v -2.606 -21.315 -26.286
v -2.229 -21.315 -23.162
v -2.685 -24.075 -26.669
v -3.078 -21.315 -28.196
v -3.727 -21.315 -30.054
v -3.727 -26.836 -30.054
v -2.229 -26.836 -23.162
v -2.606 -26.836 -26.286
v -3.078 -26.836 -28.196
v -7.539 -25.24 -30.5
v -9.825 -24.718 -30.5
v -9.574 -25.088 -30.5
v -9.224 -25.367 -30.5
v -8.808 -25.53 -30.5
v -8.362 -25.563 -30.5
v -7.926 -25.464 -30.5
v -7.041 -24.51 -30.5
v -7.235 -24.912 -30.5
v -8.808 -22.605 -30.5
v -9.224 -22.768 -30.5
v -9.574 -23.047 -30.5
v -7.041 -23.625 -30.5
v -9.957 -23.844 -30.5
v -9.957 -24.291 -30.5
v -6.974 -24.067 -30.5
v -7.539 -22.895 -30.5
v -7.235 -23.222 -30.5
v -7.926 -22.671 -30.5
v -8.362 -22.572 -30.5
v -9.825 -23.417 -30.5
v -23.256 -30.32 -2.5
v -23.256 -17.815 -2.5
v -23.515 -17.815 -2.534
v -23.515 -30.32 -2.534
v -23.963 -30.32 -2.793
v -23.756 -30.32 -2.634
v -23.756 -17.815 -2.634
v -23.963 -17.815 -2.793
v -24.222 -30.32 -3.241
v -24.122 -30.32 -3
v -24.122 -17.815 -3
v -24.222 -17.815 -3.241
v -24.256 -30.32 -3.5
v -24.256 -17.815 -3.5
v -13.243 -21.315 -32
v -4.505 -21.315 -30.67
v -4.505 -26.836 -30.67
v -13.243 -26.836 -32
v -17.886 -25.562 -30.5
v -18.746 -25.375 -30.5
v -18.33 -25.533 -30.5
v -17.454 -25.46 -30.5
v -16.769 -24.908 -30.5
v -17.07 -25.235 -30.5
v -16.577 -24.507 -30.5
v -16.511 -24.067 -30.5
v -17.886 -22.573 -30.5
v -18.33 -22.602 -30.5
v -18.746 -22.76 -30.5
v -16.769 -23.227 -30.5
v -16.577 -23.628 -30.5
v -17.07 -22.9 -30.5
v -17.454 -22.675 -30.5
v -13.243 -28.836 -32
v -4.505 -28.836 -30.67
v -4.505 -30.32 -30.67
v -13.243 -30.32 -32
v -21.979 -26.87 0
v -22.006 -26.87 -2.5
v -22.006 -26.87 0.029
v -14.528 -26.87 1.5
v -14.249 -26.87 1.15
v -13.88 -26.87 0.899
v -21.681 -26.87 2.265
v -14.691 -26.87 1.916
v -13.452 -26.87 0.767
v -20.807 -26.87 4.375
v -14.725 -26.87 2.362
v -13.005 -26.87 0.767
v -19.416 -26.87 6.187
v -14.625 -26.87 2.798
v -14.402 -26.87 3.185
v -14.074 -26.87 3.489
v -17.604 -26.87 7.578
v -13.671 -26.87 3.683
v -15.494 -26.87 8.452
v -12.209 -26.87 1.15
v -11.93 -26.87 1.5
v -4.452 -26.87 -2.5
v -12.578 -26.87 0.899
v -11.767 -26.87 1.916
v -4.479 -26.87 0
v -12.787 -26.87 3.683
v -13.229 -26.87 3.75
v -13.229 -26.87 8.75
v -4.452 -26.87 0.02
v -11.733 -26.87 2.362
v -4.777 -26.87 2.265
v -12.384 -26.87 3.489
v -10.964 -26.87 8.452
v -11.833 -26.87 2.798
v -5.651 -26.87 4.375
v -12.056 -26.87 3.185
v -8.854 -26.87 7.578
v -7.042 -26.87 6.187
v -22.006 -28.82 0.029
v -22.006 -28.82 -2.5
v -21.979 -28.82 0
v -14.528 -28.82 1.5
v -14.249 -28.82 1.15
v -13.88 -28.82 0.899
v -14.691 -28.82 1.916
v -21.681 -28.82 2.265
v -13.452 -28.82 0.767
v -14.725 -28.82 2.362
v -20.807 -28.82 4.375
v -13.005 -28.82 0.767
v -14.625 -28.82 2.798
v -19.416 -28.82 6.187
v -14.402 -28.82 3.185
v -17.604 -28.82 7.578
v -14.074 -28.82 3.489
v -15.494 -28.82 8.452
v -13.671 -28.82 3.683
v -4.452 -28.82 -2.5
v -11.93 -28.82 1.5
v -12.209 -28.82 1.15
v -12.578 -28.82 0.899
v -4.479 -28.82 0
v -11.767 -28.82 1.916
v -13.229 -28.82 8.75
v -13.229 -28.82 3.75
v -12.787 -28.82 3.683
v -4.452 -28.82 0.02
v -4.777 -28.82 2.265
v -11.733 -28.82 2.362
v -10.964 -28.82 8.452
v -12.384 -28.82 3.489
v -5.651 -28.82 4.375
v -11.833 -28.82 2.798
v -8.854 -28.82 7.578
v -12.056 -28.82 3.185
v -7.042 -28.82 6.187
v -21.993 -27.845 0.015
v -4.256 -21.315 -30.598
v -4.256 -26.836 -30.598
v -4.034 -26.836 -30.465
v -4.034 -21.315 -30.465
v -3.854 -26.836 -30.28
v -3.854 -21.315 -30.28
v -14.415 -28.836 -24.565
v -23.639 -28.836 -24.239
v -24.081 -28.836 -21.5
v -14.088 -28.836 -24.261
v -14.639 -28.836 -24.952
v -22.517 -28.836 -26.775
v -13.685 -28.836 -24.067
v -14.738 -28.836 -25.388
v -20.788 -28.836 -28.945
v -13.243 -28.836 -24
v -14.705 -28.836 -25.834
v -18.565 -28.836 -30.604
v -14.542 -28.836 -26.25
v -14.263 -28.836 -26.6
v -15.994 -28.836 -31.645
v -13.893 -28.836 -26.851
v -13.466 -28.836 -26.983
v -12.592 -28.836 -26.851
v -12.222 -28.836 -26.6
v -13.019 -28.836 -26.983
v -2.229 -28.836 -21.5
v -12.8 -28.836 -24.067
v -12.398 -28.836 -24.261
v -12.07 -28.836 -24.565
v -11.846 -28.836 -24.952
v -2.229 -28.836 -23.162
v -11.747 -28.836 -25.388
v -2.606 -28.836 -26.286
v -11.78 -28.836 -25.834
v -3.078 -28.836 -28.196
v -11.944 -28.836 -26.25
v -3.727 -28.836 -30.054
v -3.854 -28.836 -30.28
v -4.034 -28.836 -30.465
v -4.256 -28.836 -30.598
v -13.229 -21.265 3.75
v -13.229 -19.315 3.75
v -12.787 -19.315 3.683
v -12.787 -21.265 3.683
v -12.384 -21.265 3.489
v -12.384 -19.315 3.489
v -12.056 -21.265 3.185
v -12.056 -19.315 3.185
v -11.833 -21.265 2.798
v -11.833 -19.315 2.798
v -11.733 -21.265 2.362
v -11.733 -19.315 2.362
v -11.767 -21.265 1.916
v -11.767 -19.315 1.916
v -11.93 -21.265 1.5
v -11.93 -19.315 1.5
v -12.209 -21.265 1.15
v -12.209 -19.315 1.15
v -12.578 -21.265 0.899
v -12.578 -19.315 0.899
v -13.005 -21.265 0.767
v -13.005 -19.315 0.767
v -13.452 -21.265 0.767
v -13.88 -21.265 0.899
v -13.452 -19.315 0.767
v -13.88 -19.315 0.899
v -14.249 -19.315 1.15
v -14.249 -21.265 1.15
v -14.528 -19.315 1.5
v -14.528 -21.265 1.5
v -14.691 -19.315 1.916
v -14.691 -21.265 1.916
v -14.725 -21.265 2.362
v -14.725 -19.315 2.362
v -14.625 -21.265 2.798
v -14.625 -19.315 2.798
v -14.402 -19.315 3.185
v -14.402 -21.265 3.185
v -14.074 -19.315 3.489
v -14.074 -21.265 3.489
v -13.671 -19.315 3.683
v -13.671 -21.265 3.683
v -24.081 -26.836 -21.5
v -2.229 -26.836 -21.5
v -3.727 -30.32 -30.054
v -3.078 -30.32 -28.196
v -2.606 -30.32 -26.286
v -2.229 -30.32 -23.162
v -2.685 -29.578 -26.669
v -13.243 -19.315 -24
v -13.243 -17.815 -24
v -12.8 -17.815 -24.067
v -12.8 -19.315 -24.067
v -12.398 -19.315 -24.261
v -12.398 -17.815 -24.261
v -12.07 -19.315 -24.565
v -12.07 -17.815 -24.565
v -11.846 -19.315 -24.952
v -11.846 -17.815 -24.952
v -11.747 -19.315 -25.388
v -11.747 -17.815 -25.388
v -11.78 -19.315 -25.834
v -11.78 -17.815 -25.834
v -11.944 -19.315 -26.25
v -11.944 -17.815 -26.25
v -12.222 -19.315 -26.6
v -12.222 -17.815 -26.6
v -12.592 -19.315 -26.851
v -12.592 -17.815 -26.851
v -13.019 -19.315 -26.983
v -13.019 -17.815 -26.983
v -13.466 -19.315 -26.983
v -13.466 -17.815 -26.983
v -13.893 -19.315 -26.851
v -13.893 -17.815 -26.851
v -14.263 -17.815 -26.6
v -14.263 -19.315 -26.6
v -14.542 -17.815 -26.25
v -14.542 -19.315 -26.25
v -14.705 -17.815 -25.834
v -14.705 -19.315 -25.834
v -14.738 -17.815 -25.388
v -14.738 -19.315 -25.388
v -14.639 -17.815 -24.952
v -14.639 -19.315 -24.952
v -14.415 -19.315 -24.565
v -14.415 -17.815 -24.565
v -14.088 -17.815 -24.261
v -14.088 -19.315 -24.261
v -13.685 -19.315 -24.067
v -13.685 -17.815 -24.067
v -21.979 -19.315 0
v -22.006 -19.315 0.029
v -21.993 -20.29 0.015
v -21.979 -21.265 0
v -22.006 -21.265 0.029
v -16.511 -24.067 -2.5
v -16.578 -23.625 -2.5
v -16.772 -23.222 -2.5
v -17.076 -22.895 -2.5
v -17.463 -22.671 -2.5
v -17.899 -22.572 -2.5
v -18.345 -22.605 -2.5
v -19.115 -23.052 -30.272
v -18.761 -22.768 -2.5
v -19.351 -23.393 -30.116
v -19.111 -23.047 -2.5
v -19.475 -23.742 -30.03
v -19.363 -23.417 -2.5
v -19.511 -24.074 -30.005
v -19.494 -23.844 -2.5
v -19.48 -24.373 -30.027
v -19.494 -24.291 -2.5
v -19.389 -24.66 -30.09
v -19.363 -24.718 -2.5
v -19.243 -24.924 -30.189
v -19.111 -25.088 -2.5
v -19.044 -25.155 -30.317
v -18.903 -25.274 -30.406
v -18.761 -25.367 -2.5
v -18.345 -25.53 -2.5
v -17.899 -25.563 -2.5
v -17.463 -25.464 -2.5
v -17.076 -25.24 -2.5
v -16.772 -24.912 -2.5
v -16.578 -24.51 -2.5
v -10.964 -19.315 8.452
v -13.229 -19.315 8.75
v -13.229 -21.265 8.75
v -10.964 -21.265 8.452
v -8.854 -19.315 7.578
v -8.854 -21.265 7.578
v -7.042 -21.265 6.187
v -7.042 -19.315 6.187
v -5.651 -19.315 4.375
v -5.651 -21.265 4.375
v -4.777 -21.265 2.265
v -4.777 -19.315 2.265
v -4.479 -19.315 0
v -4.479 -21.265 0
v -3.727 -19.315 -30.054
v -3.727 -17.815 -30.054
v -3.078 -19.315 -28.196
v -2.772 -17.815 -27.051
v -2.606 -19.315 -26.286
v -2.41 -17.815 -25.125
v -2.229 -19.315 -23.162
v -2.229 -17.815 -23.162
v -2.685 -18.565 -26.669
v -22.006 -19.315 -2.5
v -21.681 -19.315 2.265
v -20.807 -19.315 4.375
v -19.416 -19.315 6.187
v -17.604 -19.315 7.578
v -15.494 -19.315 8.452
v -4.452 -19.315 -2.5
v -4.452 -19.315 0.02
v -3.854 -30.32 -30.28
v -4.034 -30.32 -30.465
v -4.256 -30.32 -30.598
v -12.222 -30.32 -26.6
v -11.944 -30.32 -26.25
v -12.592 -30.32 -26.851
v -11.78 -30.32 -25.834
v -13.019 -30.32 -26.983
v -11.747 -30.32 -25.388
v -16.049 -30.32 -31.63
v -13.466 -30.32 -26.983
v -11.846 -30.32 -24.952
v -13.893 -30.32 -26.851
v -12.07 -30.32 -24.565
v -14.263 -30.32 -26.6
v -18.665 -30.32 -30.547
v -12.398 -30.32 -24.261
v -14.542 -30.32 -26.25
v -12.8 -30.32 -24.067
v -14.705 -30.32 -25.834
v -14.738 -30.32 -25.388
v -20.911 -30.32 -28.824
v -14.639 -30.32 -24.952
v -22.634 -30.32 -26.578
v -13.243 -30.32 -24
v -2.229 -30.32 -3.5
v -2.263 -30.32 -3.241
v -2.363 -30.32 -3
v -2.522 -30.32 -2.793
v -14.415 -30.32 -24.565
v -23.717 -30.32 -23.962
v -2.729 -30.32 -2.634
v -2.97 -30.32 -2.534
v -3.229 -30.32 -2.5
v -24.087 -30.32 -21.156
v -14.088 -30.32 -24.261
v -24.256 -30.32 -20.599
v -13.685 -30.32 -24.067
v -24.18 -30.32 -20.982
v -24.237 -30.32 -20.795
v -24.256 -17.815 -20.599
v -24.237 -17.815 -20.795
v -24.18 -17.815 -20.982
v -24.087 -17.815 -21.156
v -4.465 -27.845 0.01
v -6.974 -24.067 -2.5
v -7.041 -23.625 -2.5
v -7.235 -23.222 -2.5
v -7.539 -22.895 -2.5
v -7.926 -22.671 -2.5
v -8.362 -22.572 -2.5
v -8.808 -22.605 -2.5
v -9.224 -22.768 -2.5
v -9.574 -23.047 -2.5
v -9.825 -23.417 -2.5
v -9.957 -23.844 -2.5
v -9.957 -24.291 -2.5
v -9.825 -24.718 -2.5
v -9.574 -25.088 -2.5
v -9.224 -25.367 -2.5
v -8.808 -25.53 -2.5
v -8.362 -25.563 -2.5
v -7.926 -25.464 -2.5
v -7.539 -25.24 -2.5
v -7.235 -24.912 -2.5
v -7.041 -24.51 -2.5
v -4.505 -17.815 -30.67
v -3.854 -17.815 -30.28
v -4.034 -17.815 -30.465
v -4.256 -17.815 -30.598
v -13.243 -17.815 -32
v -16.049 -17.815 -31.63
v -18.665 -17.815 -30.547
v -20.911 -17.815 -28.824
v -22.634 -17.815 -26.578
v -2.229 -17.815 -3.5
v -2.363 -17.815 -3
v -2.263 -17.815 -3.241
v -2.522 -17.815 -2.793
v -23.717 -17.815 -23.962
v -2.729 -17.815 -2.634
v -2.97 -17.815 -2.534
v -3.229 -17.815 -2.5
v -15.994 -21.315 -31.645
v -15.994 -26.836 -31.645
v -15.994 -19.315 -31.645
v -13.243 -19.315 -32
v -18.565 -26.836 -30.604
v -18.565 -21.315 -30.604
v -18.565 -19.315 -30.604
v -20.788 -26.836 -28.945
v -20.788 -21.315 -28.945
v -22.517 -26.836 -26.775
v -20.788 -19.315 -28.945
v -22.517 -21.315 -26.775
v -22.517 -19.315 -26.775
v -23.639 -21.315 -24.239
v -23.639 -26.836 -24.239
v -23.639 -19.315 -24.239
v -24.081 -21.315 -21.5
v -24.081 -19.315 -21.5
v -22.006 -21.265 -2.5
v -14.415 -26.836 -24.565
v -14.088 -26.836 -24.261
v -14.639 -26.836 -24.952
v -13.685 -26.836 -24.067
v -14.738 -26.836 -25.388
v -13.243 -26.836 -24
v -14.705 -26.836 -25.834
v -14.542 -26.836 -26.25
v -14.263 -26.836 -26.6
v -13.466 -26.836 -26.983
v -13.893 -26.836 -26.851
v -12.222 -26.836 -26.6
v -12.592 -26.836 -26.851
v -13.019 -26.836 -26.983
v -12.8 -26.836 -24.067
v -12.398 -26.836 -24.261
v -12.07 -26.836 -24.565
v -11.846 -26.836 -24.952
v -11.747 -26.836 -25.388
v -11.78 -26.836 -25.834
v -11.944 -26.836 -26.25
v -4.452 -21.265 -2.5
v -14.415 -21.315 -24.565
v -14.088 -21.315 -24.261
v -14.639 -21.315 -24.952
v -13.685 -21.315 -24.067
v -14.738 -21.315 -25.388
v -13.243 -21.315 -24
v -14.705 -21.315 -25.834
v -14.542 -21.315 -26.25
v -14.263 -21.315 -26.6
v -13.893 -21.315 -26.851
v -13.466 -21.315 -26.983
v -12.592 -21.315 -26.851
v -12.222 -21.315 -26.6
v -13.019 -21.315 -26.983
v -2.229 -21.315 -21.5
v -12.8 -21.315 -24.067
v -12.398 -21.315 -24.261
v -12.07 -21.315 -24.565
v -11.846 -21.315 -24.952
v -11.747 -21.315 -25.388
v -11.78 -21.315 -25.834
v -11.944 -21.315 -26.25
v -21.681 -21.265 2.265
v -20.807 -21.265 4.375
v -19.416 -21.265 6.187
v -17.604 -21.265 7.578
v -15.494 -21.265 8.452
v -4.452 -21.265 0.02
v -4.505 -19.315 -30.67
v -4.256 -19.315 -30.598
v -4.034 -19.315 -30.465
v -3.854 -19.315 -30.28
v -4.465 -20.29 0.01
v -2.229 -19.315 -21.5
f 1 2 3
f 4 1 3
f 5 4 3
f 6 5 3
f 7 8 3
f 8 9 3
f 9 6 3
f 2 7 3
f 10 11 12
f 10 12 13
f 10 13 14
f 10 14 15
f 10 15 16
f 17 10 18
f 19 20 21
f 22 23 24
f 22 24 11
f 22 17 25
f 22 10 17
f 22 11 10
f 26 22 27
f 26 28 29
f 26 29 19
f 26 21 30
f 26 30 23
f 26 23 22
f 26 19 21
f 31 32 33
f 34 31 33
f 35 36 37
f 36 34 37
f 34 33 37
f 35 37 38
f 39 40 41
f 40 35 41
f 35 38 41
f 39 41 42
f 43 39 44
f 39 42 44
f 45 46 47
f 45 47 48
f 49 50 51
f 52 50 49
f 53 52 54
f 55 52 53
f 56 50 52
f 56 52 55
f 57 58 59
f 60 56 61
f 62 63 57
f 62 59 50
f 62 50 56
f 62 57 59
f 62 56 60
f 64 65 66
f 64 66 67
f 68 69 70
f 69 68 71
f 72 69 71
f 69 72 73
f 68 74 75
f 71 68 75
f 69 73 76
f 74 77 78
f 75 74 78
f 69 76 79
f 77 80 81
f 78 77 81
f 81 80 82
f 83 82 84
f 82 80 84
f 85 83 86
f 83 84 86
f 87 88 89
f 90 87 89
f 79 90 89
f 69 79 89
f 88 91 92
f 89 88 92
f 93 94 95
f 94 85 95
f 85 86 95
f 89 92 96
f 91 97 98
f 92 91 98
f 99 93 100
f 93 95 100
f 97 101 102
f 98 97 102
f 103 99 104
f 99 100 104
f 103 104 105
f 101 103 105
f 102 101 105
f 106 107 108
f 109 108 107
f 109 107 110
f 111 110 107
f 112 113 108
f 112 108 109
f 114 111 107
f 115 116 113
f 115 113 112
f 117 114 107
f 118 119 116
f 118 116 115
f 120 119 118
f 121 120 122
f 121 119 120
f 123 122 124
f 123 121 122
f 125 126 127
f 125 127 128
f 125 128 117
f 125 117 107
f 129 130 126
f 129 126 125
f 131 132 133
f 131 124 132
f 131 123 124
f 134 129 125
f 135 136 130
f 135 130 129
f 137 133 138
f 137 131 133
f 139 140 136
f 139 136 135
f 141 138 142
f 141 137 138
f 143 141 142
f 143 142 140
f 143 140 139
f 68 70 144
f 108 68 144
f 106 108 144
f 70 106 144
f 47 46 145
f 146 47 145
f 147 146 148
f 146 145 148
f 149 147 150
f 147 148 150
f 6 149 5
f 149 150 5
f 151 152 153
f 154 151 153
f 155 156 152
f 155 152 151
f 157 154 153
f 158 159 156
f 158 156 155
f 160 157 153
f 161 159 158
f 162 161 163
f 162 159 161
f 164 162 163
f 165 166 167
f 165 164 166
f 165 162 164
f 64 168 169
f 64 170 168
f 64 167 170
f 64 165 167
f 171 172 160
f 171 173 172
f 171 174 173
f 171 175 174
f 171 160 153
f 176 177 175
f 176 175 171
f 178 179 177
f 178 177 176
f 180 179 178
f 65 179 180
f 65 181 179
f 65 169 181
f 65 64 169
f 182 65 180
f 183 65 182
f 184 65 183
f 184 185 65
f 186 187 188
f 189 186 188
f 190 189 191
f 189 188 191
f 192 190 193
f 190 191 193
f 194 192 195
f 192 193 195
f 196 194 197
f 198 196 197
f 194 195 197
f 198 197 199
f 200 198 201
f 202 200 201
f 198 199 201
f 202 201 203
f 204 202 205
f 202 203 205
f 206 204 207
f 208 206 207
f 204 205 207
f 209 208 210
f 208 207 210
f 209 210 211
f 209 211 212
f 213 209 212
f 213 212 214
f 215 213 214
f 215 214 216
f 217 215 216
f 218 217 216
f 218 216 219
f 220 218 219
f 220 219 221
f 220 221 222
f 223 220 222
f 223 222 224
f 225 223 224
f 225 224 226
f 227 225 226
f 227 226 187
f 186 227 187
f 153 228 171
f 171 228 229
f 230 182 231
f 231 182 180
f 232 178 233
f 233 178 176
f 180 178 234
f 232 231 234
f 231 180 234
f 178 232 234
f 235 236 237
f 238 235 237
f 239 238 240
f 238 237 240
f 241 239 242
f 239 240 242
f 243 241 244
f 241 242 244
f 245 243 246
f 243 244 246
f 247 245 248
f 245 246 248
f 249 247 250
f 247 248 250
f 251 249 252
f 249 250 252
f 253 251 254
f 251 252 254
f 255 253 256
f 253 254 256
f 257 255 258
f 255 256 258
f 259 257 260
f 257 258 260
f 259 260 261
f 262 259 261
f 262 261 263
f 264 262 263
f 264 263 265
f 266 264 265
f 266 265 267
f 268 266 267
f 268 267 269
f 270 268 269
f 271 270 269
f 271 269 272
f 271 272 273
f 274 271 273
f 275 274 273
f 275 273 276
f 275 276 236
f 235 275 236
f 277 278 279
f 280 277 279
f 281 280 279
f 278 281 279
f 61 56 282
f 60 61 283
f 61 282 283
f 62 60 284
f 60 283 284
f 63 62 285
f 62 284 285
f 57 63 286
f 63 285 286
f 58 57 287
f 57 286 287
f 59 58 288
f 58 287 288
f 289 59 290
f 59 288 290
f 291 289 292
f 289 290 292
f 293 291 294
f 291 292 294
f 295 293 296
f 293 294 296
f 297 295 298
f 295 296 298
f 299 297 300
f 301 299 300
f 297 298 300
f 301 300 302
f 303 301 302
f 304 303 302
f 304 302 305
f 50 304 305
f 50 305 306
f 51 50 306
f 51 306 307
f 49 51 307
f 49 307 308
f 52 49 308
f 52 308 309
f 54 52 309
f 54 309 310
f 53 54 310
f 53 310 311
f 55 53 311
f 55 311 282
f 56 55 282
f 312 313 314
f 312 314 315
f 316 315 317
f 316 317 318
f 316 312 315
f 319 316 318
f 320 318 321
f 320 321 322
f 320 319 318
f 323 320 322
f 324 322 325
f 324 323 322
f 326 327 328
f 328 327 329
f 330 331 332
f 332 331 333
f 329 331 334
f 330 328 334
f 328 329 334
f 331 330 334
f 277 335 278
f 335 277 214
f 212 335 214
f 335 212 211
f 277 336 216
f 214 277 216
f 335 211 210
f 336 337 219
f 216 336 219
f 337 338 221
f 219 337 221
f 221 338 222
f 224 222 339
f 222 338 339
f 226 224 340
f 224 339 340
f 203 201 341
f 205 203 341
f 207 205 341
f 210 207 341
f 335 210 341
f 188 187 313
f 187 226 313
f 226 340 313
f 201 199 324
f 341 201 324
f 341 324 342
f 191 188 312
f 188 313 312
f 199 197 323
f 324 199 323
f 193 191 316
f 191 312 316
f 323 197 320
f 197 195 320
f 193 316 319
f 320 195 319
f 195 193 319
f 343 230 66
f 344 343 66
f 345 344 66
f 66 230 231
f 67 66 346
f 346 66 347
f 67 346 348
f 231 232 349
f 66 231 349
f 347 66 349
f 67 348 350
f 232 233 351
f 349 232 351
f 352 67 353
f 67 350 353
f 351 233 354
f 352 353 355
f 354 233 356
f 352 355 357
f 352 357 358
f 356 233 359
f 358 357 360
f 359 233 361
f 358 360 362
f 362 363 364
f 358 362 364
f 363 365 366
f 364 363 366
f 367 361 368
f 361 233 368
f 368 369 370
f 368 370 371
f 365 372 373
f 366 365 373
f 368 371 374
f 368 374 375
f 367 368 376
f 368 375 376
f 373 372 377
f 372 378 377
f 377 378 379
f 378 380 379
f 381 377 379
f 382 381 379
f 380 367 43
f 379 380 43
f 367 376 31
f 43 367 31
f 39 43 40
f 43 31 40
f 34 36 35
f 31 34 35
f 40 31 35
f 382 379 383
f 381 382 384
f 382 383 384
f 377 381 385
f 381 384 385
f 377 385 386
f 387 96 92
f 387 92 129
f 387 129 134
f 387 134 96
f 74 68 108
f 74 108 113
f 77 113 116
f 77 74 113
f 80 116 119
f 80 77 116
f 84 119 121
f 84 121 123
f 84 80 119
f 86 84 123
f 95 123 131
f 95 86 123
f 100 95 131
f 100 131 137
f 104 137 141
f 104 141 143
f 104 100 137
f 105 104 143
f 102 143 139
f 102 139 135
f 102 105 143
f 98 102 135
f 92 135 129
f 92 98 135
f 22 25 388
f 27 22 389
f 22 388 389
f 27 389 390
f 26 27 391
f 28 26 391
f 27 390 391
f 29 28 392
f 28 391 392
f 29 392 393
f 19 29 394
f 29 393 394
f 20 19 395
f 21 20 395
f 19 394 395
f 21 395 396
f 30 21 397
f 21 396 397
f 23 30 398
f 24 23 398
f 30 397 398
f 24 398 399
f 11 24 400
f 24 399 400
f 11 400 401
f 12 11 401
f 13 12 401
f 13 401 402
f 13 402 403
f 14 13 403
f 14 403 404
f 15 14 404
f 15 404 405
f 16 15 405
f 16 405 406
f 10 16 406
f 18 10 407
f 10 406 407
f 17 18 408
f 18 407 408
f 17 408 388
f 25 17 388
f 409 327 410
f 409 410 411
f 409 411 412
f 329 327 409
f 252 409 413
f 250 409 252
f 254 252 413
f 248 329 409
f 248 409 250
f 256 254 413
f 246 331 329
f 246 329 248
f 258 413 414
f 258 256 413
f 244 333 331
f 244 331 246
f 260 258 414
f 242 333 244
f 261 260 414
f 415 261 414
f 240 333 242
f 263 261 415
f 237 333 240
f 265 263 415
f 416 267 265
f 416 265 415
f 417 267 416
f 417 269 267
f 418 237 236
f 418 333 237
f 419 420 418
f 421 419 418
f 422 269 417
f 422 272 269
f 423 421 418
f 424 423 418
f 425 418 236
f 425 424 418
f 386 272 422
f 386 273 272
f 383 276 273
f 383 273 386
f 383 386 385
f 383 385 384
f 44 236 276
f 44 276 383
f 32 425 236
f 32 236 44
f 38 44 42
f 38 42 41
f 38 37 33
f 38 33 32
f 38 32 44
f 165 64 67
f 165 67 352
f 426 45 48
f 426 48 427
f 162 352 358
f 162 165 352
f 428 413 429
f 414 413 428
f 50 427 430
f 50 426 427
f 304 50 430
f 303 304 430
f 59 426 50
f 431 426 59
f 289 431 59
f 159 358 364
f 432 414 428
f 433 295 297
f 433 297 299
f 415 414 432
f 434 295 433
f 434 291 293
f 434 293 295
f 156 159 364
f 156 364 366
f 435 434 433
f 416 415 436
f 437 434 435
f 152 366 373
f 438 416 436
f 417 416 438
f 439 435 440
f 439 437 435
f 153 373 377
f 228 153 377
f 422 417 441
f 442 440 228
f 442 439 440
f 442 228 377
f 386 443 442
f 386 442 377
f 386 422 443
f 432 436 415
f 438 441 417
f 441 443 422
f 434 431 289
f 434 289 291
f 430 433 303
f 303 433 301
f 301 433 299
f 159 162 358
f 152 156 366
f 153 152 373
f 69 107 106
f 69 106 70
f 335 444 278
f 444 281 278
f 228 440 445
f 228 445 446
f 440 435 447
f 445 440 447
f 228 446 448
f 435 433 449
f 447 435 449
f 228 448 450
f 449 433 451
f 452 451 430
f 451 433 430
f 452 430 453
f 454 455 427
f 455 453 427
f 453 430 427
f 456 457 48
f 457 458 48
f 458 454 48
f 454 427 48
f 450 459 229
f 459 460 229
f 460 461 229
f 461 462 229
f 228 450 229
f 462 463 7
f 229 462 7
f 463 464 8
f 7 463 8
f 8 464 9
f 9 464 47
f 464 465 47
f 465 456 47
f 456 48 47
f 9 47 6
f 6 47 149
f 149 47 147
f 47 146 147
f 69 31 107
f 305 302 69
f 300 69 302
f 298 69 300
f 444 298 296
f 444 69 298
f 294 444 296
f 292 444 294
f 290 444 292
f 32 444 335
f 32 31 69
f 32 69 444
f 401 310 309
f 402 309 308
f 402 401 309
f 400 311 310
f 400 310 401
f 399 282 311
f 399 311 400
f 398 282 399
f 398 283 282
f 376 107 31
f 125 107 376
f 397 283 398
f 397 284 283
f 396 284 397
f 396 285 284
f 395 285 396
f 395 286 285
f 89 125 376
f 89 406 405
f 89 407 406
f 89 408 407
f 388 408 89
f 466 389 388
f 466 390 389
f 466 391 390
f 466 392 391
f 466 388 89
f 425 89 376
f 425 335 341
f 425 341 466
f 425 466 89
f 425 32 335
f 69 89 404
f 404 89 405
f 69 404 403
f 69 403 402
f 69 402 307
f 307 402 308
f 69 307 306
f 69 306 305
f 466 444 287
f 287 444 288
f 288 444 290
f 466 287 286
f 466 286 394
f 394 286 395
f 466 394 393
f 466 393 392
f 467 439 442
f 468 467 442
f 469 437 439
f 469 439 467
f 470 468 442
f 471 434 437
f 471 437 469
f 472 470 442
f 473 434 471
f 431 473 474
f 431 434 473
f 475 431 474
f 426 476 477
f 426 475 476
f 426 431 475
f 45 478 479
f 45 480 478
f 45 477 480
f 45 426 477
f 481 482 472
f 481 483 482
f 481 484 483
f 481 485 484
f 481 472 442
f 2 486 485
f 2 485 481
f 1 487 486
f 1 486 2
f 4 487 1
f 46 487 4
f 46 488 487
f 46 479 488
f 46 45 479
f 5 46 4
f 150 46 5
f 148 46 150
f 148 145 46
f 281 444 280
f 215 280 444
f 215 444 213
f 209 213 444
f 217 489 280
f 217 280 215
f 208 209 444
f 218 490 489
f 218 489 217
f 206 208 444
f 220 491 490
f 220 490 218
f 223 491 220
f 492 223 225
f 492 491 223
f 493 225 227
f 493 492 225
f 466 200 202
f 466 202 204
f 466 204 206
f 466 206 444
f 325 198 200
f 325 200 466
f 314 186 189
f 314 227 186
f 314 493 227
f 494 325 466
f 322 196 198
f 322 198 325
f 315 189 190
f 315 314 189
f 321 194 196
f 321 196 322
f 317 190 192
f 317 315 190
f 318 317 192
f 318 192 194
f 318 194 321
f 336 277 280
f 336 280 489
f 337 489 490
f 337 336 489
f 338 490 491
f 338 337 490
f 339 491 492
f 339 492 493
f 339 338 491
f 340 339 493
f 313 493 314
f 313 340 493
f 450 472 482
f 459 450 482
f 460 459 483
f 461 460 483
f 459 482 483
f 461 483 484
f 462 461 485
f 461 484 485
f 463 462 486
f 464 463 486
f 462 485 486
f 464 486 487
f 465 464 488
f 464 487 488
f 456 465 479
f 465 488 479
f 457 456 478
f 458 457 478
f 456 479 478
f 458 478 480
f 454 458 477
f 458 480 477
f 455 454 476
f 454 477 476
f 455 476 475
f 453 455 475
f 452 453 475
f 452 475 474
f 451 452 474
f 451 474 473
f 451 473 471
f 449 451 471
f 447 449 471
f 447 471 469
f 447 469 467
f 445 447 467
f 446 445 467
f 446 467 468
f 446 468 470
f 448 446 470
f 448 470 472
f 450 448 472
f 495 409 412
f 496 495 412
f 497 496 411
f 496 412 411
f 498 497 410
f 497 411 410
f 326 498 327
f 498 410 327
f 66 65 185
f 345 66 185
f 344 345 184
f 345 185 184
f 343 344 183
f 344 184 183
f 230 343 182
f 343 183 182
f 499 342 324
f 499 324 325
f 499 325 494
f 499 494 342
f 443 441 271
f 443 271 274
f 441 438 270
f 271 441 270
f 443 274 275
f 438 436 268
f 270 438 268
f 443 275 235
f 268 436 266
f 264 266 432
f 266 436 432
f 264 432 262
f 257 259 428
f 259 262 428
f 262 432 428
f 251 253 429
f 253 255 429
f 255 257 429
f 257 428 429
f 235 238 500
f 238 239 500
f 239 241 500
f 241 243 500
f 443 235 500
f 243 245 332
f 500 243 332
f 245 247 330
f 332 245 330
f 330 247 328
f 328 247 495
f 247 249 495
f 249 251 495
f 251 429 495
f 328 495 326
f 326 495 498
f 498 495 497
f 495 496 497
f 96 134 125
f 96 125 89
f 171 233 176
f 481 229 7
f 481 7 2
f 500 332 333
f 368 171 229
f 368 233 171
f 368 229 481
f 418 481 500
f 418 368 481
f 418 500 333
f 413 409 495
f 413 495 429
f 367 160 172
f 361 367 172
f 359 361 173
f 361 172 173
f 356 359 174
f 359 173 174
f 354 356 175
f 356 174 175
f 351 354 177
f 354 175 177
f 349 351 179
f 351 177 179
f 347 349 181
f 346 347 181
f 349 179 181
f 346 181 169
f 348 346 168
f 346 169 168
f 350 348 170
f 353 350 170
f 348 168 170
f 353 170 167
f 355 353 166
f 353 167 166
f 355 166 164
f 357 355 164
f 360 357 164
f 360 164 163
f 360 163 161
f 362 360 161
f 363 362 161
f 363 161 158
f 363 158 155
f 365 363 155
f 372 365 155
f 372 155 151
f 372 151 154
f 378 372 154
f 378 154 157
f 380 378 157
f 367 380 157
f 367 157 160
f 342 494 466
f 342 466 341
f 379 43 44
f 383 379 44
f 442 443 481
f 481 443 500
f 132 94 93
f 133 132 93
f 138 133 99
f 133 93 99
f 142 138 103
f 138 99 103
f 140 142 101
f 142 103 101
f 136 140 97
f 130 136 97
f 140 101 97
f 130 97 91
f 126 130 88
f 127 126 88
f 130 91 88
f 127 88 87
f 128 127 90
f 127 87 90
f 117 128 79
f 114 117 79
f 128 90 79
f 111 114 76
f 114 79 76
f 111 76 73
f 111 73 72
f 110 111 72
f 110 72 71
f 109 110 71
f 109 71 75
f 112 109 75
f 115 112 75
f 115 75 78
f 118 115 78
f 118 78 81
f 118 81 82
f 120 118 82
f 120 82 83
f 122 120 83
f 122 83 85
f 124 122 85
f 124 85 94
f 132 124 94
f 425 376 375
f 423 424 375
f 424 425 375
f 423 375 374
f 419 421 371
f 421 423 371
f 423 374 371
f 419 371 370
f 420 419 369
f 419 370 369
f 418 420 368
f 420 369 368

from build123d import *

# Parameters (mm, degrees)
SKETCH2_W             = 17.554431489
SKETCH2_H             = 1.95
BOSS_EXTRUDE1_DEPTH   = 8.75
BOSS_EXTRUDE1_2_DEPTH = 8.75
CUT_EXTRUDE1_DEPTH    = 26.518349076
SKETCH4_W             = 22.027215745
SKETCH4_H             = 12.505427167
BOSS_EXTRUDE2_DEPTH   = 32
SKETCH5_R             = 1.5
CUT_EXTRUDE2_DEPTH    = 12
SKETCH6_W             = 22.027215745
SKETCH6_H             = 12.505427167
SKETCH6_W_2           = 17.554431489
SKETCH6_H_2           = 1.95
CUT_EXTRUDE3_DEPTH    = 2.5
SKETCH7_R             = 1.5
CUT_EXTRUDE4_DEPTH    = 13
SKETCH8_R             = 1.5
CUT_EXTRUDE5_DEPTH    = 28
FILLET3_R             = 1
SKETCH9_W             = 22.02721574
SKETCH9_H             = 2
CUT_EXTRUDE6_DEPTH    = 11


with BuildPart() as part:
    # Sketch2 → Boss-Extrude1 (new body)
    with BuildSketch(Plane.XY):
        with Locations((-13.228930986, -27.845183414)):
            Rectangle(SKETCH2_W, SKETCH2_H)
    extrude(amount=BOSS_EXTRUDE1_DEPTH)


with BuildPart() as body_2:
    # Sketch2 → Boss-Extrude1 2 (new body)
    with BuildSketch(Plane.XY):
        with Locations((-13.228930986, -20.289756247)):
            Rectangle(SKETCH2_W, SKETCH2_H)
    extrude(amount=BOSS_EXTRUDE1_2_DEPTH)


with BuildPart() as cut_extrude1_tool:
    # Sketch3 → Cut-Extrude1 (new, through all)
    with BuildSketch(Plane(origin=(0, -19.314756247, 0), x_dir=(1, 0, 0), z_dir=(0, 1, 0))):
        with BuildLine():
            ThreePointArc((-13.228930986, -8.75), (-7.041746651, -6.187184335), (-4.478930986, 0))
            add(Edge.make_bspline(
                [(-4.478930986, 0), (1.138349918, -4.151657709), (-4.451715242, -8.75)],
                knots=[0, 0, 0, 1, 1, 1], degree=2))
            add(Edge.make_bspline(
                [(-22.006146731, -8.75), (-13.228930986, -12.473510392), (-4.451715242, -8.75)],
                knots=[0, 0, 0, 1, 1, 1], degree=2))
            add(Edge.make_bspline(
                [(-21.978930986, 0), (-25.926969228, -4.242865138), (-22.006146731, -8.75)],
                knots=[0, 0, 0, 1, 1, 1], degree=2))
            ThreePointArc((-21.978930986, 0), (-19.416115322, -6.187184335), (-13.228930986, -8.75))
        make_face()
    extrude(amount=-CUT_EXTRUDE1_DEPTH)


with BuildPart() as part_1:
    add(part.part)

    # Cut-Extrude1: cut by cut_extrude1_tool
    add(cut_extrude1_tool.part, mode=Mode.SUBTRACT)



with BuildPart() as body_2_1:
    add(body_2.part)

    # Cut-Extrude1: cut by cut_extrude1_tool
    add(cut_extrude1_tool.part, mode=Mode.SUBTRACT)


with BuildPart() as part_2:
    add(part_1.part)

    add(body_2_1.part)  # Boss-Extrude2 merges body 2
    # Sketch4 → Boss-Extrude2 (add)
    with BuildSketch(Plane(origin=(0, 0, 0), x_dir=(-1, 0, 0), z_dir=(0, 0, -1))):
        with Locations((13.242538859, -24.067469831)):
            Rectangle(SKETCH4_W, SKETCH4_H)
    extrude(amount=BOSS_EXTRUDE2_DEPTH)

    # Sketch5 → Cut-Extrude2 (cut)
    with BuildSketch(Plane(origin=(0, -19.314756247, 0), x_dir=(1, 0, 0), z_dir=(0, 1, 0))):
        with Locations(Location((-13.228930986, -2.25, 0), (0, 0, 270))):
            Circle(SKETCH5_R)
    extrude(amount=-CUT_EXTRUDE2_DEPTH, mode=Mode.SUBTRACT)

    # Sketch6 → Cut-Extrude3 (cut)
    with BuildSketch(Plane.XY):
        with Locations((-13.242538859, -24.067469831)):
            Rectangle(SKETCH6_W, SKETCH6_H)
        with Locations((-13.228930986, -27.845183414)):
            Rectangle(SKETCH6_W_2, SKETCH6_H_2, mode=Mode.SUBTRACT)
        with Locations((-13.228930986, -20.289756247)):
            Rectangle(SKETCH6_W_2, SKETCH6_H_2, mode=Mode.SUBTRACT)
    extrude(amount=-CUT_EXTRUDE3_DEPTH, mode=Mode.SUBTRACT)

    # Sketch7 → Cut-Extrude4 (cut)
    with BuildSketch(Plane(origin=(0, -17.814756247, 0), x_dir=(1, 0, 0), z_dir=(0, 1, 0))):
        with Locations(Location((-13.242538859, 25.5, 0), (0, 0, 270))):
            Circle(SKETCH7_R)
        with BuildLine():
            Line((-24.086865874, 21.155672985), (-24.256146731, 21.155672985))
            add(Edge.make_bspline(
                [(-2.228930986, 21.155672985), (11.471530889, 27.189710441), (-11.765166974, 53.431279988), (-37.007876173, 21.523583672), (-24.256146731, 21.155672985)],
                knots=[0, 0, 0, 0, 0.52011282, 1, 1, 1, 1], degree=3))
            add(Edge.make_bspline(
                [(-3.948545621, 30.585343246), (-2.007113924, 26.093685314), (-2.228930986, 21.155672985)],
                knots=[0, 0, 0, 1, 1, 1], degree=2))
            Line((-3.948545621, 30.585343246), (-13.242538859, 32))
            ThreePointArc((-13.242538859, 32), (-20.910636028, 28.823770155), (-24.086865874, 21.155672985))
        make_face()
    extrude(amount=-CUT_EXTRUDE4_DEPTH, mode=Mode.SUBTRACT)

    # Sketch8 → Cut-Extrude5 (cut)
    with BuildSketch(Plane.XY.offset(-2.5)):
        with Locations((-18.011106811, -24.06746983)):
            Circle(SKETCH8_R)
        with Locations((-8.473970906, -24.06746983)):
            Circle(SKETCH8_R)
    extrude(amount=-CUT_EXTRUDE5_DEPTH, mode=Mode.SUBTRACT)

    # Fillet3
    # the kernel refuses this fillet: 1 mm, written as the material it takes off along each edge
    with BuildSketch(Plane(origin=(-24.256146731, -15.314756247, -2.5), x_dir=(1, 0, 0), z_dir=(0, -1, 0))) as fillet3_piece_1:
        with BuildLine():
            CenterArc((FILLET3_R, -FILLET3_R), FILLET3_R, 90, 90)
            Line((0, -FILLET3_R), (-FILLET3_R * 0.02, -FILLET3_R))
            Line((-FILLET3_R * 0.02, -FILLET3_R), (-FILLET3_R * 0.02, FILLET3_R * 0.02))
            Line((-FILLET3_R * 0.02, FILLET3_R * 0.02), (FILLET3_R, FILLET3_R * 0.02))
            Line((FILLET3_R, FILLET3_R * 0.02), (FILLET3_R, 0))
        make_face()
    extrude(amount=17.505427167, mode=Mode.SUBTRACT)
    with BuildSketch(Plane(origin=(-24.256146731, -16.423026869, -21.155672985), x_dir=(0, 0, 1), z_dir=(0, -1, 0))) as fillet3_piece_2:
        with BuildLine():
            CenterArc((0.556691751, -1), FILLET3_R, 90, 33.827317624)
            Line((0, -0.169280857), (-0.011133835, -0.152666474))
            ThreePointArc((-0.011133835, -0.152666474), (-0.02, -0.084640429), (-0.02, 0))
            Line((-0.02, 0), (0, 0.02))
            Line((0, 0.02), (0.556691751, 0.02))
            Line((0.556691751, 0.02), (0.556691751, 0))
        make_face()
    extrude(amount=15.288885922, mode=Mode.SUBTRACT)
    with BuildSketch(Plane(origin=(-2.228930986, -32.820183414, -2.5), x_dir=(0, 0, -1), z_dir=(0, 1, 0))) as fillet3_piece_3:
        with BuildLine():
            CenterArc((FILLET3_R, FILLET3_R), FILLET3_R, 180, 90)
            Line((0, FILLET3_R), (-FILLET3_R * 0.02, FILLET3_R))
            Line((-FILLET3_R * 0.02, FILLET3_R), (-FILLET3_R * 0.02, -FILLET3_R * 0.02))
            Line((-FILLET3_R * 0.02, -FILLET3_R * 0.02), (FILLET3_R, -FILLET3_R * 0.02))
            Line((FILLET3_R, -FILLET3_R * 0.02), (FILLET3_R, 0))
        make_face()
    extrude(amount=17.505427167, mode=Mode.SUBTRACT)
    with BuildSketch(Plane(origin=(-3.948545621, -16.375444783, -30.585343246), x_dir=(-0.9886132451058307, 0, -0.1504787413600958), z_dir=(0, -1, 0))) as fillet3_piece_4:
        with BuildLine():
            CenterArc((0.562435527, -1), FILLET3_R, 90, 59.471323616)
            Line((-0.298939504, -0.492030458), (-0.316167005, -0.481871067))
            ThreePointArc((-0.316167005, -0.481871067), (-0.168173949, -0.234650824), (-0.016955383, 0.010607308))
            Line((-0.016955383, 0.010607308), (0, 0.02))
            Line((0, 0.02), (0.562435527, 0.02))
            Line((0.562435527, 0.02), (0.562435527, 0))
        make_face()
    extrude(amount=15.384050094, mode=Mode.SUBTRACT)

    # Sketch9 → Cut-Extrude6 (cut)
    with BuildSketch(Plane.XY.offset(-32.5)):
        with Locations((-13.24253886, -20.31475625)):
            Rectangle(SKETCH9_W, SKETCH9_H)
        with Locations((-13.24253886, -27.836055834)):
            Rectangle(SKETCH9_W, SKETCH9_H)
    extrude(amount=CUT_EXTRUDE6_DEPTH, mode=Mode.SUBTRACT)


solid = part_2.part
